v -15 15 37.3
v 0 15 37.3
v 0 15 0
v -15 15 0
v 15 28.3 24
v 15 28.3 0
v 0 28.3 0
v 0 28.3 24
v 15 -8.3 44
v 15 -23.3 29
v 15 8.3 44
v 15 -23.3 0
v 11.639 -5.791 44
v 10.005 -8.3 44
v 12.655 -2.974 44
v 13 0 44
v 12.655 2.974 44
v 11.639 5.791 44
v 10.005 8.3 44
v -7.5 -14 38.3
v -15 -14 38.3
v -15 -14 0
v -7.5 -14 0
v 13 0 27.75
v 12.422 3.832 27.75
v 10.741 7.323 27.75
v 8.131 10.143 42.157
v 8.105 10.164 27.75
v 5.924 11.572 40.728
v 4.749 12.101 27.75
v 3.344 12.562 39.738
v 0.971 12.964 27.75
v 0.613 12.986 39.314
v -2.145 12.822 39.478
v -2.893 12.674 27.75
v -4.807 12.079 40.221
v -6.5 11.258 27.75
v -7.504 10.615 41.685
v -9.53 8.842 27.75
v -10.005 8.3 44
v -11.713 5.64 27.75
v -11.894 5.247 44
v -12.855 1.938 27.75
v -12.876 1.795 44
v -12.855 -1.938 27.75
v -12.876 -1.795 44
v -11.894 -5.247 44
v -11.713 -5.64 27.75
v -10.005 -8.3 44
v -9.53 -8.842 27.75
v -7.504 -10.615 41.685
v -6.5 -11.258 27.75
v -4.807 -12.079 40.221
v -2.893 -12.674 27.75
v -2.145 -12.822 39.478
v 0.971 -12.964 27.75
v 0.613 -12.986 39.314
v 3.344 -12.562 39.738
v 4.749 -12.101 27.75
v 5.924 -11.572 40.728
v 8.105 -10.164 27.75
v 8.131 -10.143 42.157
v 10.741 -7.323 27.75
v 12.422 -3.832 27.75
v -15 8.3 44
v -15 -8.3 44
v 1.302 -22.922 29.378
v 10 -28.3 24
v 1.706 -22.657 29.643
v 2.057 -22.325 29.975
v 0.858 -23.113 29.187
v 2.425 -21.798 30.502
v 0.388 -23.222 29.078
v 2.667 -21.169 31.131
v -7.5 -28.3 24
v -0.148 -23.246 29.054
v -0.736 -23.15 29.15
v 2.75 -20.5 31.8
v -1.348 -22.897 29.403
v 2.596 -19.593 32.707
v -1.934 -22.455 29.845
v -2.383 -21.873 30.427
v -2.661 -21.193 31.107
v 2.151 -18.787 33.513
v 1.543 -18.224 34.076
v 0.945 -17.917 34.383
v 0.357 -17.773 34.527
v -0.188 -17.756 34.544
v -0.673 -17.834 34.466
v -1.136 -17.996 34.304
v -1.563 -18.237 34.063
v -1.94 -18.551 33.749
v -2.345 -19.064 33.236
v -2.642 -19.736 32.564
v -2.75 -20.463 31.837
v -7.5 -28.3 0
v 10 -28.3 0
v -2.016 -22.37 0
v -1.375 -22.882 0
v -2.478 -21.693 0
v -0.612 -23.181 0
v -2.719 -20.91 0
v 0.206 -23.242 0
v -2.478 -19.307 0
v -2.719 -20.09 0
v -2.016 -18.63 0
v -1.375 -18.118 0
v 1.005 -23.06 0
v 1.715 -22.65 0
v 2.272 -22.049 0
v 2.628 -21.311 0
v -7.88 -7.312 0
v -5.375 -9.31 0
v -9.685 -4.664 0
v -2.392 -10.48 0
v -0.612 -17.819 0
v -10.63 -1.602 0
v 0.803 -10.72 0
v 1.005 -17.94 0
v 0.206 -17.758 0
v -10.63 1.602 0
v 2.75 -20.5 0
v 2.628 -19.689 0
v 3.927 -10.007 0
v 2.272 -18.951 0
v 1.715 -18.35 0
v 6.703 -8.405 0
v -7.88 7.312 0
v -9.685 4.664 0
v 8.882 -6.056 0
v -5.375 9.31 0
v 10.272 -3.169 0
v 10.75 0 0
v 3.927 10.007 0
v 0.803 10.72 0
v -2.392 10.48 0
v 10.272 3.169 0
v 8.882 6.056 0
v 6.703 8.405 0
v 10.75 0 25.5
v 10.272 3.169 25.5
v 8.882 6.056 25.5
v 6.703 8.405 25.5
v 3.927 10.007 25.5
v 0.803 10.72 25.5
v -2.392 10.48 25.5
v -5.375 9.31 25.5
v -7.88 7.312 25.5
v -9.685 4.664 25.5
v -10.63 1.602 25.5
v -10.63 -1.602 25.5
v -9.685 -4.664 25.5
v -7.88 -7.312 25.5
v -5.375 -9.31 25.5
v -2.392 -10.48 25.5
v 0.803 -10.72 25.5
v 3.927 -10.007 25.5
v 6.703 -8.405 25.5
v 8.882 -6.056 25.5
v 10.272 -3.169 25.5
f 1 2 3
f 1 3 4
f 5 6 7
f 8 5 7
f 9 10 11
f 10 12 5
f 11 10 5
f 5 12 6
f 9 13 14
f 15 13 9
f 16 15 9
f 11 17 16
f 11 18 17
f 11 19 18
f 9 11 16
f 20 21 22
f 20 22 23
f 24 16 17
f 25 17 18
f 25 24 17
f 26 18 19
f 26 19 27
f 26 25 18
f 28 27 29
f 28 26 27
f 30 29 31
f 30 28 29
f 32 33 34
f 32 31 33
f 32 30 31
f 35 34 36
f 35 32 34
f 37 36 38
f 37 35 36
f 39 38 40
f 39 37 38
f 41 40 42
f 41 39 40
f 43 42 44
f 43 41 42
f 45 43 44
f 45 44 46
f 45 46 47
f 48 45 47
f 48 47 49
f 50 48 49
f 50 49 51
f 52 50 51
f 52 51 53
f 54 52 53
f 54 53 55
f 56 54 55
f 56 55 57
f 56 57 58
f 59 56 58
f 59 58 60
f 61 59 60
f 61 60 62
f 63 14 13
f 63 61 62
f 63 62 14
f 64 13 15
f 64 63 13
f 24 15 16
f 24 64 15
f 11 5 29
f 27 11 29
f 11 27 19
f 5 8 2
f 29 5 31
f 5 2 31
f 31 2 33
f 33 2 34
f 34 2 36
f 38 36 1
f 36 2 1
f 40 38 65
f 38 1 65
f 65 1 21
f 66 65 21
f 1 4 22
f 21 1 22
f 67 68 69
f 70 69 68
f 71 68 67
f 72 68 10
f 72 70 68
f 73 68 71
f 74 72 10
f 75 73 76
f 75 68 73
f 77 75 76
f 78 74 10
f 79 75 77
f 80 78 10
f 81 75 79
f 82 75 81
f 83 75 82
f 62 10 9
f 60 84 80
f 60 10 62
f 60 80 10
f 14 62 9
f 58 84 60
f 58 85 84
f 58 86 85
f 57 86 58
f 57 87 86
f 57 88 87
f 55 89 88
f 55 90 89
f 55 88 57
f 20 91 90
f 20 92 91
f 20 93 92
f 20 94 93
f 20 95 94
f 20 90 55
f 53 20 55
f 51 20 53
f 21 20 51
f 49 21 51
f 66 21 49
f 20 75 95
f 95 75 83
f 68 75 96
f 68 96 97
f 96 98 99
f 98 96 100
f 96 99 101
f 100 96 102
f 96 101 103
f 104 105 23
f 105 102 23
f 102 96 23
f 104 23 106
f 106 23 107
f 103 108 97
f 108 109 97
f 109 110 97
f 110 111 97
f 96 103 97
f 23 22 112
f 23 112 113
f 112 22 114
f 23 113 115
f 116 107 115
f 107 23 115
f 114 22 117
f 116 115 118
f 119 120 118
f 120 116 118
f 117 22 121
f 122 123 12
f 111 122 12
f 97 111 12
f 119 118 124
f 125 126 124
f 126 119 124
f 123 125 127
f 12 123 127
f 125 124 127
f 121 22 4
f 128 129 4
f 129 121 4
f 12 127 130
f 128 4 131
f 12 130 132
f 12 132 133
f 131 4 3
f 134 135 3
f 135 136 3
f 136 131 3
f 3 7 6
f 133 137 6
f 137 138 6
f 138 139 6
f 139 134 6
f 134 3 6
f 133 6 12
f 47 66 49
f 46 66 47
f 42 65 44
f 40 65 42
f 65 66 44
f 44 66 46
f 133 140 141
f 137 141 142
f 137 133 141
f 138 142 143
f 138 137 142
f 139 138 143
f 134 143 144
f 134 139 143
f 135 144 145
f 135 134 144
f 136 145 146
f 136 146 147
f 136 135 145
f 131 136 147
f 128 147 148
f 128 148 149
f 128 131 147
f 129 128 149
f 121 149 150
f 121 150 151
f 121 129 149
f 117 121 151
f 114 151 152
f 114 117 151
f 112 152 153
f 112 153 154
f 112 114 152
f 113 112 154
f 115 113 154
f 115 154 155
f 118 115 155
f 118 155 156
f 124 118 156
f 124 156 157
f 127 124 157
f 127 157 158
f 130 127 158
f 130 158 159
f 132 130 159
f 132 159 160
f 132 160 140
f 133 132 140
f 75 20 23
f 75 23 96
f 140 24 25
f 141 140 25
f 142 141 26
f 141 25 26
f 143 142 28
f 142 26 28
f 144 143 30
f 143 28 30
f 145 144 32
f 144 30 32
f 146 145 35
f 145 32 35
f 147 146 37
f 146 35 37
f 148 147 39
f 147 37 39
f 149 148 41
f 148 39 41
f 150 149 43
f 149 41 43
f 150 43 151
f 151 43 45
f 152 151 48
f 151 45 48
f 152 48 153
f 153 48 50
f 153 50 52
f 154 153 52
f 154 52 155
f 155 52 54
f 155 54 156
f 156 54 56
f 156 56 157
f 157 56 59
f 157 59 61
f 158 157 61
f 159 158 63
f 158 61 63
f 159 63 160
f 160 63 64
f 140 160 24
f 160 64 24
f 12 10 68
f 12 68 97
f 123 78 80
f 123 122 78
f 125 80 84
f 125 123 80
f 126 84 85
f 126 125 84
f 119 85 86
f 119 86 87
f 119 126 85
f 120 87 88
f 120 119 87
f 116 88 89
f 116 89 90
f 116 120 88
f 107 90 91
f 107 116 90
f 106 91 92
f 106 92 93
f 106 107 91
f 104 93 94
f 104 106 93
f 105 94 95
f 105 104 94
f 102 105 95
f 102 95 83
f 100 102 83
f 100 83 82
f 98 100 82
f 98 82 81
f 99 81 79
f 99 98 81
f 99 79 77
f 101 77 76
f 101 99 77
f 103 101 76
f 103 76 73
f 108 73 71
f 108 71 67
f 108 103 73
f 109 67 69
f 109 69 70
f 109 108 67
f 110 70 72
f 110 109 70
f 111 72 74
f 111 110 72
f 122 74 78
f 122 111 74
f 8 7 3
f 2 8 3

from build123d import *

# Parameters (mm, degrees)
F0_R        = 2.75
F0_R_2      = 13
F0_R_3      = 10.75
F1_DEPTH    = 30
F2_START    = 30
F2_DEPTH    = 14
F3_S5_R     = 13
F3_T6_DEPTH = 23
F4_SIZE     = 5
F5_T1_DEPTH = 117.8673195186
F5_T3_DEPTH = 120.3673195186


# Not quite as in the source:
# - a fillet or chamfer that OpenCascade refuses, or shapes differently, is made with other operations: its cross-section is extruded or revolved along the edge and cut away or added


with BuildPart() as f1:
    # F0 (on Top) → F1 (new body)
    with BuildSketch(Plane.XY):
        Polygon((0, 28.3), (0, 15), (-15, 15), (-15, -14), (-7.5, -14), (-7.5, -28.3), (0, -28.3), (15, -28.3), (15, 15), (15, 28.3), align=None)
        with Locations((0, -20.5)):
            Circle(F0_R, mode=Mode.SUBTRACT)
        Circle(F0_R_2, mode=Mode.SUBTRACT)
        Circle(F0_R_2)
        Circle(F0_R_3, mode=Mode.SUBTRACT)
    extrude(amount=F1_DEPTH)

    # F0 (on Top) → F2 (join)
    with BuildSketch(Plane.XY.offset(F2_START)):
        Polygon((0, 28.3), (0, 15), (-15, 15), (-15, -14), (-7.5, -14), (-7.5, -28.3), (0, -28.3), (15, -28.3), (15, 15), (15, 28.3), align=None)
        with Locations((0, -20.5)):
            Circle(F0_R, mode=Mode.SUBTRACT)
        Circle(F0_R_2, mode=Mode.SUBTRACT)
    extrude(amount=F2_DEPTH)

    # F3: chamfer of 4.5 on 1 edges, made by hand


with BuildPart() as f3_tool2:
    # F3_s3 → F3_t4 (revolve)
    with BuildSketch(Plane.XZ):
        Polygon((10.75, 25.5), (15.25, 30), (10.75, 30), align=None)
    revolve(axis=Axis((0, 0, 30), (0, 0, 1)))

    # F3_s5 → F3_t6 (intersect, symmetric)
    with BuildSketch(Plane.XY.offset(27.8)):
        Circle(F3_S5_R)
    extrude(amount=F3_T6_DEPTH, both=True, mode=Mode.INTERSECT)


with BuildPart() as f1_1:
    add(f1.part)

    # F3_t1: cut F3_tool2
    add(f3_tool2.part, mode=Mode.SUBTRACT)

    # F4
    f4_edges = [f1_1.edges().sort_by_distance(p)[0] for p in [
        (15, -28.3, 22),
    ]]
    chamfer(f4_edges, length=F4_SIZE)

    # F5: chamfer of 20 on 2 edges, made by hand

    # F5_s2 → F5_t1 (cut)
    with BuildSketch(Plane.YZ.offset(-51.4336597593)):
        Polygon((28.3, 24), (8.3, 44), (28.3, 44), align=None)
    extrude(amount=F5_T1_DEPTH, mode=Mode.SUBTRACT)

    # F5_s4 → F5_t3 (cut)
    with BuildSketch(Plane.YZ.offset(-58.9336597593)):
        Polygon((-28.3, 24), (-8.3, 44), (-28.3, 44), align=None)
    extrude(amount=F5_T3_DEPTH, mode=Mode.SUBTRACT)


solid = f1_1.part
